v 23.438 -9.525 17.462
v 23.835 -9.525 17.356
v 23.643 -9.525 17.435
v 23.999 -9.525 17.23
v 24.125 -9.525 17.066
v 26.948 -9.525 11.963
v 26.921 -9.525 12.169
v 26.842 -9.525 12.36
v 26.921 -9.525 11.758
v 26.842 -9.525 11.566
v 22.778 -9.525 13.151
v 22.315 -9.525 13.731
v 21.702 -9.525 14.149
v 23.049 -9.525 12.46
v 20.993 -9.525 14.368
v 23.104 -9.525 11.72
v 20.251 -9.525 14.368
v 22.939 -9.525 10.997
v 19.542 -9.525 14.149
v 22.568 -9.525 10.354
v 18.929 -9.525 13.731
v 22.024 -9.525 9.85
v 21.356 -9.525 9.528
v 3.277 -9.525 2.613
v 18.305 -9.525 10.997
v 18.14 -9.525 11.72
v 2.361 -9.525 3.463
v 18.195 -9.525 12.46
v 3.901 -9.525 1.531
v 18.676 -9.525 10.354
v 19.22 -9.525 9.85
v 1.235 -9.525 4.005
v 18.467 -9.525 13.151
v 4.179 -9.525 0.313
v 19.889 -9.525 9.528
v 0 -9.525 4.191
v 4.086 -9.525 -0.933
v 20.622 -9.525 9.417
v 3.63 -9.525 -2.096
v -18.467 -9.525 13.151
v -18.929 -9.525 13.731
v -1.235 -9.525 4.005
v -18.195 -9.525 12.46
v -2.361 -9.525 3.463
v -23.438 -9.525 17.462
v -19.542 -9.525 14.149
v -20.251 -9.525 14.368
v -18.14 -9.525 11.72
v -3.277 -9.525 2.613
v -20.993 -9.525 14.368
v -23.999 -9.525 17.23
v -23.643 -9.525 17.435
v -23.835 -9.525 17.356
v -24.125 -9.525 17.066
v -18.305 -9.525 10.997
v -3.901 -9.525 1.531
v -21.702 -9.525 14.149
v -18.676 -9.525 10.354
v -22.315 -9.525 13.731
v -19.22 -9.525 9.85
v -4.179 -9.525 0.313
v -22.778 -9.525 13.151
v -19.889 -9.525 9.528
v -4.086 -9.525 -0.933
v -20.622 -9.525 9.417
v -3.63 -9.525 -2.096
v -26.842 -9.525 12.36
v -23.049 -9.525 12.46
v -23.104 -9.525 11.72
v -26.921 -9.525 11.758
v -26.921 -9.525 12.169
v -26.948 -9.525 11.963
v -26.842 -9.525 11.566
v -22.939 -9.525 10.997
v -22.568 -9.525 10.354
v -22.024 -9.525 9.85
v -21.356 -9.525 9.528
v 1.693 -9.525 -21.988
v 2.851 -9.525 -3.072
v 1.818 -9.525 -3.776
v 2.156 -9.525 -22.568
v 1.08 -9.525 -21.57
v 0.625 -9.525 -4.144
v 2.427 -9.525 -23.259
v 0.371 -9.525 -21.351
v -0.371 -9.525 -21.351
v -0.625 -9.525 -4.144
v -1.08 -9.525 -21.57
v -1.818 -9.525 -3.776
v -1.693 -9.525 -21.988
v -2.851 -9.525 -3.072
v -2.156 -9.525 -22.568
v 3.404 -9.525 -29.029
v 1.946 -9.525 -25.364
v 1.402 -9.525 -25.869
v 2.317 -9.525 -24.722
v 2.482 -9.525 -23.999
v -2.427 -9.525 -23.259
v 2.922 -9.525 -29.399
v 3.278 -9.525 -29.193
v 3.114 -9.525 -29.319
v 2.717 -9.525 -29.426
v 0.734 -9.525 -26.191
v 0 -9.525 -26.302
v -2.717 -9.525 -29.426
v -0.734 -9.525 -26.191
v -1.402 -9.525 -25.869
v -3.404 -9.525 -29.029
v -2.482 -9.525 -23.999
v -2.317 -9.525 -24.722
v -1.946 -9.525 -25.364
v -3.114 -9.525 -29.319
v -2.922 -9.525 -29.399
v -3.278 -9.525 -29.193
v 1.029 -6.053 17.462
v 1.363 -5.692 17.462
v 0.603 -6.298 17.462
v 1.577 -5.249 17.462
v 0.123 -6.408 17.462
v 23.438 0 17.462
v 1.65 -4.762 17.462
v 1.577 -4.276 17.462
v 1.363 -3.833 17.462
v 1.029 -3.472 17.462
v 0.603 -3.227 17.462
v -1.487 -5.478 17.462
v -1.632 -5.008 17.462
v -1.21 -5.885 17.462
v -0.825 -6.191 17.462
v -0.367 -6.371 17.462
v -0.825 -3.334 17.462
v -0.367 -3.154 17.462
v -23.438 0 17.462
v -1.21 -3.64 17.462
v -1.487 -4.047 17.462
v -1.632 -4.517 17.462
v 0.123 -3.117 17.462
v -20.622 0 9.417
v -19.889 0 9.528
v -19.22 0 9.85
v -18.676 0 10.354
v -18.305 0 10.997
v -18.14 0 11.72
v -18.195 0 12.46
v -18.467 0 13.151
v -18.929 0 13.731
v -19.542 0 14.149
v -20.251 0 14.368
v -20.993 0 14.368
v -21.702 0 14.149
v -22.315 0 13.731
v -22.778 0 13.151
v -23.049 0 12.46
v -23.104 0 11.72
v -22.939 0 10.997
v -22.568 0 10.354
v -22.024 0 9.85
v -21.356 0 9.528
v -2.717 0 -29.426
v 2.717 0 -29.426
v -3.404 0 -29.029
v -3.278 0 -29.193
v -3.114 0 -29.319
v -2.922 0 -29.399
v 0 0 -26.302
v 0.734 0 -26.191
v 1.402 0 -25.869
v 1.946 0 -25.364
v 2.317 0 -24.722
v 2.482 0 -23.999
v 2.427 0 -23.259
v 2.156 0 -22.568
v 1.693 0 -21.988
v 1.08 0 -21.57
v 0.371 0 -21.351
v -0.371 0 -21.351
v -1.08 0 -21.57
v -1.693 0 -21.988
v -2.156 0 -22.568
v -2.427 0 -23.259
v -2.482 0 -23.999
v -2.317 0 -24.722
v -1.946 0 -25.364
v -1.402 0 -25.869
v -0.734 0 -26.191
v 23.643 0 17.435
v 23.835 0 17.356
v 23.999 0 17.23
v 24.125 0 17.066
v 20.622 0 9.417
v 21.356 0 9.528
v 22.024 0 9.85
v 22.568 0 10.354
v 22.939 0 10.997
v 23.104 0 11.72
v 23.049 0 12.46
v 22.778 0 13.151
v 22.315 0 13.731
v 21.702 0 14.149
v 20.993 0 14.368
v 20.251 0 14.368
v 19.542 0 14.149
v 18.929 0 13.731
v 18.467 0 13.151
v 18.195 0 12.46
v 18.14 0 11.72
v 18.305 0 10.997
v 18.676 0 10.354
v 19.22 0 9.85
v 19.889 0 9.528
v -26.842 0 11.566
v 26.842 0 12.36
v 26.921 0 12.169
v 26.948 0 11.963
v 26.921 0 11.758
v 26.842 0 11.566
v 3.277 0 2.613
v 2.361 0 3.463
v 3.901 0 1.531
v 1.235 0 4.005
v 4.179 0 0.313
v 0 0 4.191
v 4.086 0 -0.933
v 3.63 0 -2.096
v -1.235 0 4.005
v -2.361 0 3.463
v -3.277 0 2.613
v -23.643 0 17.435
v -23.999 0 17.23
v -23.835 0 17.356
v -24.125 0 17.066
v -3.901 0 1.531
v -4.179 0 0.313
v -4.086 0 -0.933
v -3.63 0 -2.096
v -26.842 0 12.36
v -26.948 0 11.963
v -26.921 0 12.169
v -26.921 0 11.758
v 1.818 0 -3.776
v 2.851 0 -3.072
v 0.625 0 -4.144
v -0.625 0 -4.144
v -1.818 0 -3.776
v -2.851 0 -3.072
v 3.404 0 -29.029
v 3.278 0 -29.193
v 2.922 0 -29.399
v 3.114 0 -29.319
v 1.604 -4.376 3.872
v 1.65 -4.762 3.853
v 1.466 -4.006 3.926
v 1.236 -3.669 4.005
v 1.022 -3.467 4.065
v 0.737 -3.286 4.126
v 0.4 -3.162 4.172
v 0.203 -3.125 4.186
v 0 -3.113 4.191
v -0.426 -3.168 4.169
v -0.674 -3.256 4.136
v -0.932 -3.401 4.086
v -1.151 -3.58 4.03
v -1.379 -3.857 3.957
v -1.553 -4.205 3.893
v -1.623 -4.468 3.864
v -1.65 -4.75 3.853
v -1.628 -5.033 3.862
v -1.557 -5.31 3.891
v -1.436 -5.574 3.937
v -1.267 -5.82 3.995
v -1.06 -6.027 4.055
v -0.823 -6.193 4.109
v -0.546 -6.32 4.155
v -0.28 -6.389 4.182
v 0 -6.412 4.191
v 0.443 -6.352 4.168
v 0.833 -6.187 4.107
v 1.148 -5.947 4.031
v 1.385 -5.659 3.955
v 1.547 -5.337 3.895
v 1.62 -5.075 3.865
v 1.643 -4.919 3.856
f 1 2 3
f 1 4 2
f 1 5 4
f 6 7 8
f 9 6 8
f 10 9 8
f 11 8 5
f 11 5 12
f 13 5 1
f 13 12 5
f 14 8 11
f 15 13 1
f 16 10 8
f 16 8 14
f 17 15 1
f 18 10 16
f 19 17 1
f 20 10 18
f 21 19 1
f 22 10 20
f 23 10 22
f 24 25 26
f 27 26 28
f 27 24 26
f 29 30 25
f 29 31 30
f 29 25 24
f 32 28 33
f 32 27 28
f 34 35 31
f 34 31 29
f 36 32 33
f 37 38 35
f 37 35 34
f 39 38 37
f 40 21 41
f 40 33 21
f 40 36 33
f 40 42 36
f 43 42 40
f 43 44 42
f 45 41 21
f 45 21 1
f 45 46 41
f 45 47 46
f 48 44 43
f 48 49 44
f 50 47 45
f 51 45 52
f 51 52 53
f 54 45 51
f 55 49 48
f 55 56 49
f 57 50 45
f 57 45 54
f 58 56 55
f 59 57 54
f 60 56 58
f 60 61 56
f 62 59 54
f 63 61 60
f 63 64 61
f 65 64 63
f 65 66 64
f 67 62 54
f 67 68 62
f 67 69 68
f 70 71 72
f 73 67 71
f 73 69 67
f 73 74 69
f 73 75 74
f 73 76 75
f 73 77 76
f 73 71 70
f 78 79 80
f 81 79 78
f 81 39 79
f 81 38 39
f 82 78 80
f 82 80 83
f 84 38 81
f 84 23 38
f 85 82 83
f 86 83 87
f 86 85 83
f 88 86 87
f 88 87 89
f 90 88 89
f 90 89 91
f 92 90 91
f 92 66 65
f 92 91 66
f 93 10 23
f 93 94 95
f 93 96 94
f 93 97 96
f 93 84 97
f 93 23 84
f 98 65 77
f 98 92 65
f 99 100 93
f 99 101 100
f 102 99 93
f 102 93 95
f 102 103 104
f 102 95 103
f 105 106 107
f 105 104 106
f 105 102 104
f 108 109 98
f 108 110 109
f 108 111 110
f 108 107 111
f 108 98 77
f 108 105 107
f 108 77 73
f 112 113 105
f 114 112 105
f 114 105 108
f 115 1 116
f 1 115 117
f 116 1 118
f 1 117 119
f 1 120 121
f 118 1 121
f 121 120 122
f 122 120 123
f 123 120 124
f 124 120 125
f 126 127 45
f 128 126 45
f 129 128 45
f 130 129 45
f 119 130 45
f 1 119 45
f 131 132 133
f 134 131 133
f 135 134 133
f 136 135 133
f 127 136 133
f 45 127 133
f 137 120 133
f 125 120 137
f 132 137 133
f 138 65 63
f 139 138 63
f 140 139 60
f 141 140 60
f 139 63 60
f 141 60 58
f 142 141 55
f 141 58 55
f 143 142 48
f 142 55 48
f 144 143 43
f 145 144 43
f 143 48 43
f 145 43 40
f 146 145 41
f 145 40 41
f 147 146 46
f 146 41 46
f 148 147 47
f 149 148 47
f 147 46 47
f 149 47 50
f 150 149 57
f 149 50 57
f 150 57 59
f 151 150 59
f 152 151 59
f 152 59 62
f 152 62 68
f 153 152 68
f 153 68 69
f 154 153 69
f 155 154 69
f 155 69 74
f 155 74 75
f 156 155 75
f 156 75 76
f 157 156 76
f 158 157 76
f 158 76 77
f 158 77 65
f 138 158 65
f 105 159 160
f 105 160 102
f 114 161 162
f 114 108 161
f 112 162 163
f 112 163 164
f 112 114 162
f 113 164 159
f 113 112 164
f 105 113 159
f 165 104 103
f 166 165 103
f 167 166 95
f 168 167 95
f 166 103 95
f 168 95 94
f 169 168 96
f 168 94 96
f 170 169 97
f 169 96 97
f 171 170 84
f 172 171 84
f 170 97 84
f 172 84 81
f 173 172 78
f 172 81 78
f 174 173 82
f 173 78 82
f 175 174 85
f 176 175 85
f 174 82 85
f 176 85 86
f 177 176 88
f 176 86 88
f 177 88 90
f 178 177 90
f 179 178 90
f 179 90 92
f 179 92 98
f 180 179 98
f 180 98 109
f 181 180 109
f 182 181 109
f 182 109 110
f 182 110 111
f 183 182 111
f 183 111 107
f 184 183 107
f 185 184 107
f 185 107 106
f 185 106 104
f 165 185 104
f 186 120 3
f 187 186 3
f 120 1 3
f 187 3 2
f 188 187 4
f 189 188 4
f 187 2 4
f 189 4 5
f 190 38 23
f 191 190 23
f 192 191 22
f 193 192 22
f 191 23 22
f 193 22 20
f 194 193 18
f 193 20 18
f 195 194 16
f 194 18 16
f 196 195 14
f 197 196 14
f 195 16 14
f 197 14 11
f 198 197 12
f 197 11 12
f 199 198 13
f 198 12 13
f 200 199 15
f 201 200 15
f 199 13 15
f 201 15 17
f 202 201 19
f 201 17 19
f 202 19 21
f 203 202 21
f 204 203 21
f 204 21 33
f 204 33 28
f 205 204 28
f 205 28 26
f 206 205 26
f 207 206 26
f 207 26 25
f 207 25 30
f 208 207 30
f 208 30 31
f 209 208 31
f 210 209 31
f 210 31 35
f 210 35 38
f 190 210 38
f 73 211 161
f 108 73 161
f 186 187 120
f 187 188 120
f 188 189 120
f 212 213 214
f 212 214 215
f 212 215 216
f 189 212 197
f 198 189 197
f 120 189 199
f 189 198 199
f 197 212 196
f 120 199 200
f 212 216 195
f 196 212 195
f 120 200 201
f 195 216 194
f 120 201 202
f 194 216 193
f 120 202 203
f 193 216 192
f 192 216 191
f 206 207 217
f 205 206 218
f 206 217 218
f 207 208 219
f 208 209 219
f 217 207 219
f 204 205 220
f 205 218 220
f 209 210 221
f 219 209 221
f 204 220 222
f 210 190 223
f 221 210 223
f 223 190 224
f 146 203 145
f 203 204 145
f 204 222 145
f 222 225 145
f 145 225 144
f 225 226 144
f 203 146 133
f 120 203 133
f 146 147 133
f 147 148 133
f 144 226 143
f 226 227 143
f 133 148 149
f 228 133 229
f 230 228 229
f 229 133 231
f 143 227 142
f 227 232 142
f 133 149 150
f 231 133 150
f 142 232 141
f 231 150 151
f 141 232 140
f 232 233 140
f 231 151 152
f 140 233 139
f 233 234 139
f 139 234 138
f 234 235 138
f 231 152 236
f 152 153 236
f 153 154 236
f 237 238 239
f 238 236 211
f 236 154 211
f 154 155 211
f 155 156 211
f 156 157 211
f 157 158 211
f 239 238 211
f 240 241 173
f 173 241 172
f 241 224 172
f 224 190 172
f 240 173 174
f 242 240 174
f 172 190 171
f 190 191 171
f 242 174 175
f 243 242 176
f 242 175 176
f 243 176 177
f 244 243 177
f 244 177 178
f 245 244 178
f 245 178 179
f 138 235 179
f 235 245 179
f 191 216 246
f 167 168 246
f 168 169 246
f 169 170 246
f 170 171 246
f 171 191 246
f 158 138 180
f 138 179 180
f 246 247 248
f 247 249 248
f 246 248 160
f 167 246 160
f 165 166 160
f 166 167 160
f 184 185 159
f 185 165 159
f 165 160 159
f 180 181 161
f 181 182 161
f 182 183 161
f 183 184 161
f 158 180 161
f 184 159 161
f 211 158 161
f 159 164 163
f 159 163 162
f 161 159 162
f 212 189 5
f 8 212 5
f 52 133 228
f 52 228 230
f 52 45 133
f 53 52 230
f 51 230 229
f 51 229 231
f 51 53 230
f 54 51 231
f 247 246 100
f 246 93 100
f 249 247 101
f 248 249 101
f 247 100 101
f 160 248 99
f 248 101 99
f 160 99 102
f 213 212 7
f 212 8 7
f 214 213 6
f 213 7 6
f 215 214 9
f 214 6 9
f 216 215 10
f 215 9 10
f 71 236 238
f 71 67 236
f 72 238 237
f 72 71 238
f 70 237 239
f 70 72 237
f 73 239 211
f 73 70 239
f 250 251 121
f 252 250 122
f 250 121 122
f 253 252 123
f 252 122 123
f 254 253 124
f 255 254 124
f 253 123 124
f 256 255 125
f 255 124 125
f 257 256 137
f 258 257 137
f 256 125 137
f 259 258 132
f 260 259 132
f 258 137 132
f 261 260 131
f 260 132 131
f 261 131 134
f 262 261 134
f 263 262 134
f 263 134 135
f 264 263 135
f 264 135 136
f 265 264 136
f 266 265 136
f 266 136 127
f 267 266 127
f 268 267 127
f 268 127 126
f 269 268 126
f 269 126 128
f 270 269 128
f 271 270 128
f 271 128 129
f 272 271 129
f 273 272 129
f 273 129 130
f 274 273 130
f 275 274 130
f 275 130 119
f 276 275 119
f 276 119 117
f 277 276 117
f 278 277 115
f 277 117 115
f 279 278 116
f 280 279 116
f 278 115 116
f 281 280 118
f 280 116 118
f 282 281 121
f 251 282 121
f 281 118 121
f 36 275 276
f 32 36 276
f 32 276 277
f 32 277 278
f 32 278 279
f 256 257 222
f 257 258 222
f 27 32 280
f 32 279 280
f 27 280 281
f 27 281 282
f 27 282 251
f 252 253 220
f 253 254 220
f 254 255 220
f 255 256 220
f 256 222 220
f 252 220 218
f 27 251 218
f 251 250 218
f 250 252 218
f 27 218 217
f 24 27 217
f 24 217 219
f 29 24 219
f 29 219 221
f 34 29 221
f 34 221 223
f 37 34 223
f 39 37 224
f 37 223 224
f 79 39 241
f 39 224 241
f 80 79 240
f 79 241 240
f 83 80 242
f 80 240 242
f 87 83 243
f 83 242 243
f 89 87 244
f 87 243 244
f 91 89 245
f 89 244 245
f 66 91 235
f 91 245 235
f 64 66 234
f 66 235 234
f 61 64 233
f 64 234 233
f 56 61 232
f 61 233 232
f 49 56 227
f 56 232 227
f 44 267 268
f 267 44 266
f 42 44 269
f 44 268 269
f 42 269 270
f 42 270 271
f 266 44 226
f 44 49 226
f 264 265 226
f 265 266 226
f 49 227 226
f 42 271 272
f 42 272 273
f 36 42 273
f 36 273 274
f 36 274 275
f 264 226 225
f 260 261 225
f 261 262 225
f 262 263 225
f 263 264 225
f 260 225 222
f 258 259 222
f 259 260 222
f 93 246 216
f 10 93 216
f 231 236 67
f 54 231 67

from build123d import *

# Parameters (mm, degrees)
SKETCH1_R                        = 4.191
BOSS_EXTRUDE1_DEPTH              = 9.525
F_10_CLEARANCE_HOLE1_D           = 4.9784
TAP_DRILL_FOR_M4X0_7_TAP1_REACH  = 62.679
TAP_DRILL_FOR_M4X0_7_TAP1_BORE_R = 1.65
CHAMFER1_SIZE                    = 6.35
CHAMFER1_EDGE_2_SIZE             = 6.35
CHAMFER1_EDGE_3_SIZE             = 6.35
FILLET2_R                        = 0.79375


with BuildPart() as part:
    # Sketch1 → Boss-Extrude1 (new body)
    with BuildSketch(Plane(origin=(0, 0, 0), x_dir=(1, 0, 0), z_dir=(0, 1, 0))):
        Polygon((0, 34.925), (30.245937227, -17.4625), (-30.245937227, -17.4625), align=None)
        with Locations(Location((0, 0, 0), (0, 0, 270))):
            Circle(SKETCH1_R, mode=Mode.SUBTRACT)
    extrude(amount=-BOSS_EXTRUDE1_DEPTH)

    # #10 Clearance Hole1 (through all)
    with Locations(Plane(origin=(0, 0, -23.8125), x_dir=(0, 0, 1), z_dir=(0, 1, 0))):
        with Locations((0, 0), (35.71875, 20.622229928), (35.71875, -20.622229928)):
            Hole(F_10_CLEARANCE_HOLE1_D / 2)

    # Tap Drill for M4x0.7 Tap1 bore (on position points) → Tap Drill for M4x0.7 Tap1 (cut, up to next)
    with BuildSketch(Plane(origin=(0, -4.7625, 17.4625), x_dir=(1, 0, 0), z_dir=(0, 0, 1)), mode=Mode.PRIVATE) as tap_drill_for_m4x0_7_tap1_sk1:
        Circle(TAP_DRILL_FOR_M4X0_7_TAP1_BORE_R)
    tap_drill_for_m4x0_7_tap1_tool1 = extrude(tap_drill_for_m4x0_7_tap1_sk1.sketch, amount=-TAP_DRILL_FOR_M4X0_7_TAP1_REACH, mode=Mode.PRIVATE) & part.part
    add(tap_drill_for_m4x0_7_tap1_tool1.solids().sort_by_distance((0, -4.7625, 17.4625))[0], mode=Mode.SUBTRACT)

    # Chamfer1
    chamfer1_edges = [part.edges().sort_by_distance(p)[0] for p in [
        (0, -4.7625, -34.925),
    ]]
    chamfer(chamfer1_edges, length=CHAMFER1_SIZE)

    # Chamfer1 edge 2
    chamfer1_edge_2_edges = [part.edges().sort_by_distance(p)[0] for p in [
        (30.245937227, -4.7625, 17.4625),
    ]]
    chamfer(chamfer1_edge_2_edges, length=CHAMFER1_EDGE_2_SIZE)

    # Chamfer1 edge 3
    chamfer1_edge_3_edges = [part.edges().sort_by_distance(p)[0] for p in [
        (-30.245937227, -4.7625, 17.4625),
    ]]
    chamfer(chamfer1_edge_3_edges, length=CHAMFER1_EDGE_3_SIZE)

    # Fillet2
    fillet2_edges = [part.edges().sort_by_distance(p)[0] for p in [
        (-3.175, -4.7625, -29.425738686),
        (-27.070937227, -4.7625, 11.963238686),
        (23.895937227, -4.7625, 17.4625),
        (-23.895937227, -4.7625, 17.4625),
        (3.175, -4.7625, -29.425738686),
        (27.070937227, -4.7625, 11.963238686),
    ]]
    fillet(fillet2_edges, radius=FILLET2_R)


solid = part.part
